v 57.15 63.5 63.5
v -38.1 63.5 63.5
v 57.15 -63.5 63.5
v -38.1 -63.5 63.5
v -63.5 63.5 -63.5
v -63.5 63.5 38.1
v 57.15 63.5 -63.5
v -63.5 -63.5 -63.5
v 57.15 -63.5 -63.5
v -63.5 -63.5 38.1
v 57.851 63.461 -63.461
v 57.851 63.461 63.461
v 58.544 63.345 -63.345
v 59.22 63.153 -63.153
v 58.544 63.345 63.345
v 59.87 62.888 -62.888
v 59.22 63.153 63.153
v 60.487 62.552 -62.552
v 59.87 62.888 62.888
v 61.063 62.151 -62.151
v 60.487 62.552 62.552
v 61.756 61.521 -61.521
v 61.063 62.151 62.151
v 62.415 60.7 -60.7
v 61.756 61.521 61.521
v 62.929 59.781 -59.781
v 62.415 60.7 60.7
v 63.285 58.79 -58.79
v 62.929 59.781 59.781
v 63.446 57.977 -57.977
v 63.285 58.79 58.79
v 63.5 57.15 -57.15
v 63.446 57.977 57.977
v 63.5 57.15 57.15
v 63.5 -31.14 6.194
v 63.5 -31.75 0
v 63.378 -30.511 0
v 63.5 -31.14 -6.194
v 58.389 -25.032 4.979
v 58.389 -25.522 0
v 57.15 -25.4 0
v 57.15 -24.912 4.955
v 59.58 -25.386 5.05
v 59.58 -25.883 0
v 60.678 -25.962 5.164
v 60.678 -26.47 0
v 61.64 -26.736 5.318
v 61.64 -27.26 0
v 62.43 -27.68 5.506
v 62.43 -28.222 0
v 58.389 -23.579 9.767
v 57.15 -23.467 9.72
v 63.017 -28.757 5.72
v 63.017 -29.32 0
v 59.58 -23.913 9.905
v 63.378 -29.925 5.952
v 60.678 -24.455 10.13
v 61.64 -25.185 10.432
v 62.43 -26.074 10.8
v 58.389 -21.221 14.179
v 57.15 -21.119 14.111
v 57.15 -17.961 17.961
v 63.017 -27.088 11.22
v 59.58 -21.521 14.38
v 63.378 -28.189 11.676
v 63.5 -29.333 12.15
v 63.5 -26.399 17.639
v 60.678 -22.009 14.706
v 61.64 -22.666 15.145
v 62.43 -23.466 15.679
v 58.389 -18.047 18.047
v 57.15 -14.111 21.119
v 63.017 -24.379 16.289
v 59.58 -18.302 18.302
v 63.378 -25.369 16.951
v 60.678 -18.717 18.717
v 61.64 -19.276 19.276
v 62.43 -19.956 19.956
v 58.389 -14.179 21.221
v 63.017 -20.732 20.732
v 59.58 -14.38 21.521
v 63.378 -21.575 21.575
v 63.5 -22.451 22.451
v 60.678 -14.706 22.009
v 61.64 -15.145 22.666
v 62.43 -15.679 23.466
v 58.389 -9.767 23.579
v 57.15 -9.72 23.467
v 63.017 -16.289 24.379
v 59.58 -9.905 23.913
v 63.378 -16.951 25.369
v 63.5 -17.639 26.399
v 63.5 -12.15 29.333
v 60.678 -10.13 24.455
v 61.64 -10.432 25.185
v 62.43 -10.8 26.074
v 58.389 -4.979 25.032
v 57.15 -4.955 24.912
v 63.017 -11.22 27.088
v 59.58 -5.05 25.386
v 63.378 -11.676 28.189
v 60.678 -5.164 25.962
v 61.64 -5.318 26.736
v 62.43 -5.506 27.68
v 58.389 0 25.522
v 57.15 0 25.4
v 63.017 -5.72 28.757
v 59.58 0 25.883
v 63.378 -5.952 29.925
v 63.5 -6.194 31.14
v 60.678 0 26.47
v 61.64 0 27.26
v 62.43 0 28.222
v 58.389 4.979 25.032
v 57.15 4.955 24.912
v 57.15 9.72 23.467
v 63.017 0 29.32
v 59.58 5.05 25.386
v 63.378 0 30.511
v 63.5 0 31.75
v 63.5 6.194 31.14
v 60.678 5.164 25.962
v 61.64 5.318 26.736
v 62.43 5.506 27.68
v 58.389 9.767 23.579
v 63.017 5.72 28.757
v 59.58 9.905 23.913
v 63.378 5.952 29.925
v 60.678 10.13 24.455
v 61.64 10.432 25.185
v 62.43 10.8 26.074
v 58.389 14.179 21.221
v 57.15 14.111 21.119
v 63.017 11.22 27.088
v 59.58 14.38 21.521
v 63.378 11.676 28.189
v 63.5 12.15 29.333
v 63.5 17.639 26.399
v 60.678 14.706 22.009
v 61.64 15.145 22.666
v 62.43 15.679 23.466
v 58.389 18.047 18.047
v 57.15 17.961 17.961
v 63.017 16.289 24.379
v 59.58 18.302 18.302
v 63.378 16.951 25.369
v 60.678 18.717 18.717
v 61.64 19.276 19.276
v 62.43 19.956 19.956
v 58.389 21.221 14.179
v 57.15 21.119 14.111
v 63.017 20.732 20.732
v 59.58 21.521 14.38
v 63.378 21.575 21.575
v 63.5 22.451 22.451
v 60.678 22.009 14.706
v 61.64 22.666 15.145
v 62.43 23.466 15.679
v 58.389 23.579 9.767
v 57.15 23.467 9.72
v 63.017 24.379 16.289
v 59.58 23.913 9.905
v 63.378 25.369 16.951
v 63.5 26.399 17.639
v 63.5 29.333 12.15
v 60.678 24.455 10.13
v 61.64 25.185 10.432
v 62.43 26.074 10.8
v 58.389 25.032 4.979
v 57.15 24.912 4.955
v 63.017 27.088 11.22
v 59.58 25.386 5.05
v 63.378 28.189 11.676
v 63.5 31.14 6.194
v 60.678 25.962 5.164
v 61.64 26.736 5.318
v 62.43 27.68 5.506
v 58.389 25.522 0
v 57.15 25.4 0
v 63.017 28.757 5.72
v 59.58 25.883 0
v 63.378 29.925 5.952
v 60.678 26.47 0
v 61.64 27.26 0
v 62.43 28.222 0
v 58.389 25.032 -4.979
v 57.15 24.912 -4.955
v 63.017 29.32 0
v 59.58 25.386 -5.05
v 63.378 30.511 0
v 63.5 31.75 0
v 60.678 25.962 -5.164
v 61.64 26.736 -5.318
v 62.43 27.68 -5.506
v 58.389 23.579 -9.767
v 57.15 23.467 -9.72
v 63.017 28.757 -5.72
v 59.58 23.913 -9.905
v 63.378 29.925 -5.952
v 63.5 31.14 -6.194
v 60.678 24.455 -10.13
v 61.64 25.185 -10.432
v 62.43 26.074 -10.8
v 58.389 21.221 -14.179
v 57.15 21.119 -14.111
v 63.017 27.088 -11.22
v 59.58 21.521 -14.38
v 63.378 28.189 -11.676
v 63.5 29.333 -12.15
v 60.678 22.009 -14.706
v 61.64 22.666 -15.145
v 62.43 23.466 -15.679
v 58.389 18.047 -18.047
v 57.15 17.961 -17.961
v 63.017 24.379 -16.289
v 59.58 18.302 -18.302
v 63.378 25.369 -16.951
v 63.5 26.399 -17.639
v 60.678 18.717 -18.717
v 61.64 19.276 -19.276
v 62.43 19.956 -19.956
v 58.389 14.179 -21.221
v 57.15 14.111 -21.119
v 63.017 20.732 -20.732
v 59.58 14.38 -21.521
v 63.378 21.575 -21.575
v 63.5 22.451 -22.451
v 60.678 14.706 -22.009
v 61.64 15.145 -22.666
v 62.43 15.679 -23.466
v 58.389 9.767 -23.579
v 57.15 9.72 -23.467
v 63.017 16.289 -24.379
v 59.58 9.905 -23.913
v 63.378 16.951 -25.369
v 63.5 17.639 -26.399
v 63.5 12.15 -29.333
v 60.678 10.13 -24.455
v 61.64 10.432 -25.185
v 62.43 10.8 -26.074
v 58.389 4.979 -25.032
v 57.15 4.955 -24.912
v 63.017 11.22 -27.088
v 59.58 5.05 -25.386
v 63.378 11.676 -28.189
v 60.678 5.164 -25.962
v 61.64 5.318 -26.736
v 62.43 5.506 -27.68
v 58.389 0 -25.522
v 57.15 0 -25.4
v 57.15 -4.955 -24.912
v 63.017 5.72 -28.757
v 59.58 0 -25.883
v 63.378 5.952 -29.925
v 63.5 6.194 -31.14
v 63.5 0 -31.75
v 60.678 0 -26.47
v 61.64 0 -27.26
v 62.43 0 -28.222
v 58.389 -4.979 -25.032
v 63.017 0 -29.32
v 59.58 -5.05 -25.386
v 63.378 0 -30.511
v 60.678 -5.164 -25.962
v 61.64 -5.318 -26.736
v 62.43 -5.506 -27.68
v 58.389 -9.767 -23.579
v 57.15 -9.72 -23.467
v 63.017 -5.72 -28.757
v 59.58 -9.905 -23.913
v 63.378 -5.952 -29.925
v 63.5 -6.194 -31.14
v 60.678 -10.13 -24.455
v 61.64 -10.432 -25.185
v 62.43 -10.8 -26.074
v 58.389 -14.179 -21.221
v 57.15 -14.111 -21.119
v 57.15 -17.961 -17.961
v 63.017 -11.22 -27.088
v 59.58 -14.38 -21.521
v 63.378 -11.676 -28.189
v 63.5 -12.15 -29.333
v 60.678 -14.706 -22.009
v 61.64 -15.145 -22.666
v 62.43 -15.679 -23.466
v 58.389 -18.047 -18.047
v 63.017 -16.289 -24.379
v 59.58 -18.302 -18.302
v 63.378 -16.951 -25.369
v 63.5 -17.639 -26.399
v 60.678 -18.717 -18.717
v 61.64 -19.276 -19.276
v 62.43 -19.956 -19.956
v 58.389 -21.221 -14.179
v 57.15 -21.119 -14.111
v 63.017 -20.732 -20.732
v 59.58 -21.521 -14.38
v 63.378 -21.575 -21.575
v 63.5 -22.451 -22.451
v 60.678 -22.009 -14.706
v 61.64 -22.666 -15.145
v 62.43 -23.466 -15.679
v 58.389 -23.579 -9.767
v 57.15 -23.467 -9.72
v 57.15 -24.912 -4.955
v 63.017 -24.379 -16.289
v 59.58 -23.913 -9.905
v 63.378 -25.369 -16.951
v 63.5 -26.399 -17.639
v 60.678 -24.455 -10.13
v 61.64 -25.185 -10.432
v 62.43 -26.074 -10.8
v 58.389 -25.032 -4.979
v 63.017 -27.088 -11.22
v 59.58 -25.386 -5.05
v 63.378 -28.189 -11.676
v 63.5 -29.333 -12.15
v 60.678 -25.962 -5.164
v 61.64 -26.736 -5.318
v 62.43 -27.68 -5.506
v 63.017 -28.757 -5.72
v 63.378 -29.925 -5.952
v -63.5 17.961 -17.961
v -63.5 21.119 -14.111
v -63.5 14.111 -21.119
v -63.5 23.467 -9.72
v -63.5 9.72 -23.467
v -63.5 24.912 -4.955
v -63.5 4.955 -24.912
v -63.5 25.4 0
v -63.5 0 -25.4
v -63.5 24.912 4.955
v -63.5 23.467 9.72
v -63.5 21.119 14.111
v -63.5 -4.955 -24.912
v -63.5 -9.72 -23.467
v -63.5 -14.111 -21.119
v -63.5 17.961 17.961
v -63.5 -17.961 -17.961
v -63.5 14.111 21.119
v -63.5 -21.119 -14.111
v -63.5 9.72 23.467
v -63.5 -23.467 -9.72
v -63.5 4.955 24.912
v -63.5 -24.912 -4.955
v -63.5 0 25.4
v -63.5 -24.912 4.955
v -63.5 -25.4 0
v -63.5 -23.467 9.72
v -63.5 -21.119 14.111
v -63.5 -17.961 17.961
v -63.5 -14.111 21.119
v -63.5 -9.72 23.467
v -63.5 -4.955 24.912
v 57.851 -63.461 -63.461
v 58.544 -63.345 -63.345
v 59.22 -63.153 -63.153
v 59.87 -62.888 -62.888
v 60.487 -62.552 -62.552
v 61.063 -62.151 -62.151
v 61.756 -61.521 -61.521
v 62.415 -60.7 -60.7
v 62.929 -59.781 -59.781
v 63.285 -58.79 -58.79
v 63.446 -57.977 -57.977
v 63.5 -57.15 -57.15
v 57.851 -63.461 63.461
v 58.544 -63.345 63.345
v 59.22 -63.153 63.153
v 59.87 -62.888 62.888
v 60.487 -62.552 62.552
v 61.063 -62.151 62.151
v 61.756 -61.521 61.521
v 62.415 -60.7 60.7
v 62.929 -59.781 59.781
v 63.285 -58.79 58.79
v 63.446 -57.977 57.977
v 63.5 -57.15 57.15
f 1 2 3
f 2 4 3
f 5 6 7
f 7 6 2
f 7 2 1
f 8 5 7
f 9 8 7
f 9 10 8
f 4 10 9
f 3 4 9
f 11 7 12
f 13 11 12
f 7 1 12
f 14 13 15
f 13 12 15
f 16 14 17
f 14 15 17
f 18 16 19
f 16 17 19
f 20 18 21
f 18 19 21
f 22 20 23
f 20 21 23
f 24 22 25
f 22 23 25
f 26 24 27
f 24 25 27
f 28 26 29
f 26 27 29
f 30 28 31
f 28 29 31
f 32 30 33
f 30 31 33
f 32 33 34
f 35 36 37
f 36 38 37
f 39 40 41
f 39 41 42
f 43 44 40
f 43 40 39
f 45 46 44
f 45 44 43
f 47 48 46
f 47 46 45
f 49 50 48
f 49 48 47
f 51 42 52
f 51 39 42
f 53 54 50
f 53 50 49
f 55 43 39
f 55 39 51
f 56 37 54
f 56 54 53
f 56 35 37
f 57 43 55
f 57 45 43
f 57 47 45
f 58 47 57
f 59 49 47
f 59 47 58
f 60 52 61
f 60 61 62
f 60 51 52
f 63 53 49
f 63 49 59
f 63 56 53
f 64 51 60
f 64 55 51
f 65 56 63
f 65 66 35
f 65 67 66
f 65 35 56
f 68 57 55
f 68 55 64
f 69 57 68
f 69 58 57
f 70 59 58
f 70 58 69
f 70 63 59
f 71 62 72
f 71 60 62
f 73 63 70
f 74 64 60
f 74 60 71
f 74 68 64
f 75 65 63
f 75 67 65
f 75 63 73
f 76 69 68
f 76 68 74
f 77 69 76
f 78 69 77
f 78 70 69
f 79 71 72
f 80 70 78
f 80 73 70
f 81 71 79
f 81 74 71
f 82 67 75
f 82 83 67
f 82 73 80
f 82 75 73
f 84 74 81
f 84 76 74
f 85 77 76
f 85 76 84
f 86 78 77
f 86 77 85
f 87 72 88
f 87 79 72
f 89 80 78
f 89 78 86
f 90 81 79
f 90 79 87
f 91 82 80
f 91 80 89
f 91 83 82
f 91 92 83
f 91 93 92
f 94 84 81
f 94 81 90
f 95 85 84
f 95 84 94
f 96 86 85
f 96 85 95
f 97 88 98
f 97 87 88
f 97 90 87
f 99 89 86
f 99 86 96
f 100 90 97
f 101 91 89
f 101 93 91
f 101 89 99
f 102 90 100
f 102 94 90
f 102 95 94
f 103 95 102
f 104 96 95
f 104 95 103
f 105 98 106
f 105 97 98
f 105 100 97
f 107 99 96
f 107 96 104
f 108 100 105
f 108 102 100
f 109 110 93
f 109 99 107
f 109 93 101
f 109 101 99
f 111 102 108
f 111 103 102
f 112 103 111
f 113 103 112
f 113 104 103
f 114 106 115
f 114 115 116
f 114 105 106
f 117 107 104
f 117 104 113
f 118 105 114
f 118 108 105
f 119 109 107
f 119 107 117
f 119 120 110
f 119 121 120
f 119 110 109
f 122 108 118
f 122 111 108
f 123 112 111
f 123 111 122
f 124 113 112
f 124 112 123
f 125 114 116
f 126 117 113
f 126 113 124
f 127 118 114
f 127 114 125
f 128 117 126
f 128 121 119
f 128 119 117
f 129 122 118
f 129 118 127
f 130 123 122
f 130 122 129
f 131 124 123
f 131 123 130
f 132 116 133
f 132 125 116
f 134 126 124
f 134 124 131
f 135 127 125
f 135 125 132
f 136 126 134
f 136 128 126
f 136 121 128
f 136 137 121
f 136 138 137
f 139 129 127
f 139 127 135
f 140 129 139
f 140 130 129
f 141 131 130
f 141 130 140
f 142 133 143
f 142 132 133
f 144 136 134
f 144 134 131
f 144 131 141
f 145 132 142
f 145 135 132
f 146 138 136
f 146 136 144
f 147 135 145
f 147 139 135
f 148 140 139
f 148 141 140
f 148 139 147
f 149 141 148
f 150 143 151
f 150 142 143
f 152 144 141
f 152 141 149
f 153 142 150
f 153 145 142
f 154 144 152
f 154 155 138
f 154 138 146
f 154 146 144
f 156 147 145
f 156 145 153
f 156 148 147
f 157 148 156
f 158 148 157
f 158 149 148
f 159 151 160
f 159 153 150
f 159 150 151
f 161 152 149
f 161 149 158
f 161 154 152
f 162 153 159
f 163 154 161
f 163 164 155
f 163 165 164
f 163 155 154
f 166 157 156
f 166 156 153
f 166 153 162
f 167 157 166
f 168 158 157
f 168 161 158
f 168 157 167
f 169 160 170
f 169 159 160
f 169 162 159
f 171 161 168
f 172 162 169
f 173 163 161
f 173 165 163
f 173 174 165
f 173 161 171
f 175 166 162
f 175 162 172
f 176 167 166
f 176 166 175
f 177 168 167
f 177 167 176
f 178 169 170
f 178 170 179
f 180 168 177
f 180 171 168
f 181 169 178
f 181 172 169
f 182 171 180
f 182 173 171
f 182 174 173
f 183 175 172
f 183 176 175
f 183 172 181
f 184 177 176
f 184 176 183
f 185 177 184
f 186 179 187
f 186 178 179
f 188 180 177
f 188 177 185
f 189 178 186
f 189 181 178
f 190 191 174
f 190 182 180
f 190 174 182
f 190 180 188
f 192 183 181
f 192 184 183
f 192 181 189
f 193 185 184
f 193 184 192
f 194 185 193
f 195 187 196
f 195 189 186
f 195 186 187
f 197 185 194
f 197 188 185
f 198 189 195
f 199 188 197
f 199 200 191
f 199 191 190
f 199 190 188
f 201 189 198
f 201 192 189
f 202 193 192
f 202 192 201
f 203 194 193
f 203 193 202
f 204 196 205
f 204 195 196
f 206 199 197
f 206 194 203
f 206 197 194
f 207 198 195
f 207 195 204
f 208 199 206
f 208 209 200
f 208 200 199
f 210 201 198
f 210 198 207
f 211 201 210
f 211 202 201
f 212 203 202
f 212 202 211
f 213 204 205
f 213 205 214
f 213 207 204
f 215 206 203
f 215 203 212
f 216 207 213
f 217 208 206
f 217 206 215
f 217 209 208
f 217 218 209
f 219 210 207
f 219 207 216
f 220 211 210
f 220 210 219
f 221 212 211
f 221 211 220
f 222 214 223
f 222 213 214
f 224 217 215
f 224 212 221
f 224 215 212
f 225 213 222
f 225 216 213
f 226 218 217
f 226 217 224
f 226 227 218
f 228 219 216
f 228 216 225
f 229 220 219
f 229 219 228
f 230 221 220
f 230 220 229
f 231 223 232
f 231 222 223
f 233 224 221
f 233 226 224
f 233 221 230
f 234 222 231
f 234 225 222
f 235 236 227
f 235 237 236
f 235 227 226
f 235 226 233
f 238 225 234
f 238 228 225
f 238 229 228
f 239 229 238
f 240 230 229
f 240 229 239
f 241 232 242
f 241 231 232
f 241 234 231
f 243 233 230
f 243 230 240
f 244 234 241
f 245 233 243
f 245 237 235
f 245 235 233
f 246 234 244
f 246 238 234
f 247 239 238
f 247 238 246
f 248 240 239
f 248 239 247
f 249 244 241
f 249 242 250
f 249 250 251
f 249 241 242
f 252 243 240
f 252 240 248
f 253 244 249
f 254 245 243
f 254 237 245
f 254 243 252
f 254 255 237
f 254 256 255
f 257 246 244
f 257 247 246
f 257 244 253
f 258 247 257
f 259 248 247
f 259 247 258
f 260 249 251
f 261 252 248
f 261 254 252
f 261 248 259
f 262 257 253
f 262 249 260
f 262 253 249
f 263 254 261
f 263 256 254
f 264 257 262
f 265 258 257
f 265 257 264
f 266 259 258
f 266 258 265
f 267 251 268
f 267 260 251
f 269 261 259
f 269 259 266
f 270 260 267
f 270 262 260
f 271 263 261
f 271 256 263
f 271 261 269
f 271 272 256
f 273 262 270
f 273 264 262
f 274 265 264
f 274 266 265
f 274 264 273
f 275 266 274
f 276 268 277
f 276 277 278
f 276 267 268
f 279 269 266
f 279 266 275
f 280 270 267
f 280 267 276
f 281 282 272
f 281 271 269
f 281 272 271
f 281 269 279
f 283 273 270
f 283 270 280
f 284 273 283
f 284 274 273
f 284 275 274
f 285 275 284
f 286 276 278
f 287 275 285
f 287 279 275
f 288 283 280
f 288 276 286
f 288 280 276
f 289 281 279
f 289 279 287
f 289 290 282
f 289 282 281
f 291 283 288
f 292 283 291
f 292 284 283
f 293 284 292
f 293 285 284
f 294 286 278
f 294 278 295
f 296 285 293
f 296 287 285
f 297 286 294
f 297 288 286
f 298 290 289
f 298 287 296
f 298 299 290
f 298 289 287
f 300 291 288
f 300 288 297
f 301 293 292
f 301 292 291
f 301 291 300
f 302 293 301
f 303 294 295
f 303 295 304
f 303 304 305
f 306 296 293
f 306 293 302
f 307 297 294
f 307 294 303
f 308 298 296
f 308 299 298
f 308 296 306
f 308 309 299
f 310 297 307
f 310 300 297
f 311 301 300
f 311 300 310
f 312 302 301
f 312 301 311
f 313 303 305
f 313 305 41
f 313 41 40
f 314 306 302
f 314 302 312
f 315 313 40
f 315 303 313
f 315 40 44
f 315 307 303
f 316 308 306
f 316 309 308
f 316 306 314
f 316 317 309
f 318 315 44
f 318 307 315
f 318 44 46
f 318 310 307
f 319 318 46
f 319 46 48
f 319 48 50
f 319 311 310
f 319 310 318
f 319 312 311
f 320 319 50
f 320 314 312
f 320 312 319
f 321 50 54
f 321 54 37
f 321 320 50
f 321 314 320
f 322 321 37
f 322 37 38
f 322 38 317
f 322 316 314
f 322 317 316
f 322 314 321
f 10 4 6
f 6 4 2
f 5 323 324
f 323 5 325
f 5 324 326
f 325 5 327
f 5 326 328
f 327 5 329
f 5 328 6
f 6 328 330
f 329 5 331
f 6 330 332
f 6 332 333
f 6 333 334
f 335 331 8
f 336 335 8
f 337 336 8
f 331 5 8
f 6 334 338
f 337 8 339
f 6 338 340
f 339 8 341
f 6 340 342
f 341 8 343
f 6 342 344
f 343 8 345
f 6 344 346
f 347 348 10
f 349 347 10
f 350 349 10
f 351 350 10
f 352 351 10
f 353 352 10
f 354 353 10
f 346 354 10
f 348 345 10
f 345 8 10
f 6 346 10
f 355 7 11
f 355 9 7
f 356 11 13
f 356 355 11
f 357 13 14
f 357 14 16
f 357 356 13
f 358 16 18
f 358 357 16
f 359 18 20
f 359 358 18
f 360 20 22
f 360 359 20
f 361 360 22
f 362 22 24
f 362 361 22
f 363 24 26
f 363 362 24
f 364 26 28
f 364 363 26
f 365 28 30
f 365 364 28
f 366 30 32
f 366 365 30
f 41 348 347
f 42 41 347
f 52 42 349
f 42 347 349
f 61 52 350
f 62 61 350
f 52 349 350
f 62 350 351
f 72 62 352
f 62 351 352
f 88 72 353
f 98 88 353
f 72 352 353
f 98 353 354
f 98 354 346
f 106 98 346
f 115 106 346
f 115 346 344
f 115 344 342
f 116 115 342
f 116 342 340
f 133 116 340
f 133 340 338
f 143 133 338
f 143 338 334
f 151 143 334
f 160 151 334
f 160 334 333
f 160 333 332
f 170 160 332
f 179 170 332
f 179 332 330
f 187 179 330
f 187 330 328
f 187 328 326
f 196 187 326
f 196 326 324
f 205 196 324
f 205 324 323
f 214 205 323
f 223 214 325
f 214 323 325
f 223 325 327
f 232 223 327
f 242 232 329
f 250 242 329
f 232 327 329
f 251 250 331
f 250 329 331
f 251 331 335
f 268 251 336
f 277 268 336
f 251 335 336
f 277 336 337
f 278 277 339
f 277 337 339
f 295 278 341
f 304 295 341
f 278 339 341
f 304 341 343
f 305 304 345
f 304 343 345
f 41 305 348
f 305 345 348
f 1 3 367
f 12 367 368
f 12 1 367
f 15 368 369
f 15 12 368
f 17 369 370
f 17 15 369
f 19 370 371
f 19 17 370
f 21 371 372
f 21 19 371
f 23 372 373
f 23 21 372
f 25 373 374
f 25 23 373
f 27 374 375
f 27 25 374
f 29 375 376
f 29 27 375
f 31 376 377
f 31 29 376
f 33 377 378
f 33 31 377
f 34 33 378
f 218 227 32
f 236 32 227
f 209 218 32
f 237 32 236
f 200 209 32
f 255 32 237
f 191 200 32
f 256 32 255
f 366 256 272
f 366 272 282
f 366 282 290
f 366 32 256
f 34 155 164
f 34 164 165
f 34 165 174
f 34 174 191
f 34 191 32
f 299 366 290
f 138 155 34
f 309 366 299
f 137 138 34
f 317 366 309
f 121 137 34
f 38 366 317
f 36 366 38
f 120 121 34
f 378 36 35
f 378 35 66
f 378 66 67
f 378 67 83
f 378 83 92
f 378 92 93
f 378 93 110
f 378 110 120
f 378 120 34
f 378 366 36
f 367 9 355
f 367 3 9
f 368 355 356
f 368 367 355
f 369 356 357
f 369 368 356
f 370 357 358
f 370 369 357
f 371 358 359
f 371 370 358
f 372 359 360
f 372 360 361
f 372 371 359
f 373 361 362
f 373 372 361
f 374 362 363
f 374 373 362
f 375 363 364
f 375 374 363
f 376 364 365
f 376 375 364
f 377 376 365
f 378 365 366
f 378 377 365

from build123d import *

# Parameters (mm, degrees)
F0_W     = 127
F0_H     = 127
F1_DEPTH = 63.5
F2_SIZE  = 25.4
F3_R     = 25.4
F4_DEPTH = 127.001
F5_R     = 6.35


with BuildPart() as f1:
    # F0 (on Front) → F1 (new body, symmetric)
    with BuildSketch(Plane.XZ):
        Rectangle(F0_W, F0_H)
    extrude(amount=F1_DEPTH, both=True)

    # F2
    f2_edges = [f1.edges().sort_by_distance(p)[0] for p in [
        (-63.5, 0, 63.5),
    ]]
    chamfer(f2_edges, length=F2_SIZE)

    # F3 (on face) → F4 (cut, through all)
    with BuildSketch(Plane(origin=(-63.5, 0, 0), x_dir=(0, -1, 0), z_dir=(-1, 0, 0))):
        Circle(F3_R)
    extrude(amount=-F4_DEPTH, mode=Mode.SUBTRACT)

    # F5
    f5_edges = [f1.edges().sort_by_distance(p)[0] for p in [
        (63.5, 63.5, 0),
        (63.5, 0, -63.5),
        (63.5, 0, 63.5),
        (63.5, -63.5, 0),
        (63.5, 25.4, 0),
    ]]
    fillet(f5_edges, radius=F5_R)


solid = f1.part
